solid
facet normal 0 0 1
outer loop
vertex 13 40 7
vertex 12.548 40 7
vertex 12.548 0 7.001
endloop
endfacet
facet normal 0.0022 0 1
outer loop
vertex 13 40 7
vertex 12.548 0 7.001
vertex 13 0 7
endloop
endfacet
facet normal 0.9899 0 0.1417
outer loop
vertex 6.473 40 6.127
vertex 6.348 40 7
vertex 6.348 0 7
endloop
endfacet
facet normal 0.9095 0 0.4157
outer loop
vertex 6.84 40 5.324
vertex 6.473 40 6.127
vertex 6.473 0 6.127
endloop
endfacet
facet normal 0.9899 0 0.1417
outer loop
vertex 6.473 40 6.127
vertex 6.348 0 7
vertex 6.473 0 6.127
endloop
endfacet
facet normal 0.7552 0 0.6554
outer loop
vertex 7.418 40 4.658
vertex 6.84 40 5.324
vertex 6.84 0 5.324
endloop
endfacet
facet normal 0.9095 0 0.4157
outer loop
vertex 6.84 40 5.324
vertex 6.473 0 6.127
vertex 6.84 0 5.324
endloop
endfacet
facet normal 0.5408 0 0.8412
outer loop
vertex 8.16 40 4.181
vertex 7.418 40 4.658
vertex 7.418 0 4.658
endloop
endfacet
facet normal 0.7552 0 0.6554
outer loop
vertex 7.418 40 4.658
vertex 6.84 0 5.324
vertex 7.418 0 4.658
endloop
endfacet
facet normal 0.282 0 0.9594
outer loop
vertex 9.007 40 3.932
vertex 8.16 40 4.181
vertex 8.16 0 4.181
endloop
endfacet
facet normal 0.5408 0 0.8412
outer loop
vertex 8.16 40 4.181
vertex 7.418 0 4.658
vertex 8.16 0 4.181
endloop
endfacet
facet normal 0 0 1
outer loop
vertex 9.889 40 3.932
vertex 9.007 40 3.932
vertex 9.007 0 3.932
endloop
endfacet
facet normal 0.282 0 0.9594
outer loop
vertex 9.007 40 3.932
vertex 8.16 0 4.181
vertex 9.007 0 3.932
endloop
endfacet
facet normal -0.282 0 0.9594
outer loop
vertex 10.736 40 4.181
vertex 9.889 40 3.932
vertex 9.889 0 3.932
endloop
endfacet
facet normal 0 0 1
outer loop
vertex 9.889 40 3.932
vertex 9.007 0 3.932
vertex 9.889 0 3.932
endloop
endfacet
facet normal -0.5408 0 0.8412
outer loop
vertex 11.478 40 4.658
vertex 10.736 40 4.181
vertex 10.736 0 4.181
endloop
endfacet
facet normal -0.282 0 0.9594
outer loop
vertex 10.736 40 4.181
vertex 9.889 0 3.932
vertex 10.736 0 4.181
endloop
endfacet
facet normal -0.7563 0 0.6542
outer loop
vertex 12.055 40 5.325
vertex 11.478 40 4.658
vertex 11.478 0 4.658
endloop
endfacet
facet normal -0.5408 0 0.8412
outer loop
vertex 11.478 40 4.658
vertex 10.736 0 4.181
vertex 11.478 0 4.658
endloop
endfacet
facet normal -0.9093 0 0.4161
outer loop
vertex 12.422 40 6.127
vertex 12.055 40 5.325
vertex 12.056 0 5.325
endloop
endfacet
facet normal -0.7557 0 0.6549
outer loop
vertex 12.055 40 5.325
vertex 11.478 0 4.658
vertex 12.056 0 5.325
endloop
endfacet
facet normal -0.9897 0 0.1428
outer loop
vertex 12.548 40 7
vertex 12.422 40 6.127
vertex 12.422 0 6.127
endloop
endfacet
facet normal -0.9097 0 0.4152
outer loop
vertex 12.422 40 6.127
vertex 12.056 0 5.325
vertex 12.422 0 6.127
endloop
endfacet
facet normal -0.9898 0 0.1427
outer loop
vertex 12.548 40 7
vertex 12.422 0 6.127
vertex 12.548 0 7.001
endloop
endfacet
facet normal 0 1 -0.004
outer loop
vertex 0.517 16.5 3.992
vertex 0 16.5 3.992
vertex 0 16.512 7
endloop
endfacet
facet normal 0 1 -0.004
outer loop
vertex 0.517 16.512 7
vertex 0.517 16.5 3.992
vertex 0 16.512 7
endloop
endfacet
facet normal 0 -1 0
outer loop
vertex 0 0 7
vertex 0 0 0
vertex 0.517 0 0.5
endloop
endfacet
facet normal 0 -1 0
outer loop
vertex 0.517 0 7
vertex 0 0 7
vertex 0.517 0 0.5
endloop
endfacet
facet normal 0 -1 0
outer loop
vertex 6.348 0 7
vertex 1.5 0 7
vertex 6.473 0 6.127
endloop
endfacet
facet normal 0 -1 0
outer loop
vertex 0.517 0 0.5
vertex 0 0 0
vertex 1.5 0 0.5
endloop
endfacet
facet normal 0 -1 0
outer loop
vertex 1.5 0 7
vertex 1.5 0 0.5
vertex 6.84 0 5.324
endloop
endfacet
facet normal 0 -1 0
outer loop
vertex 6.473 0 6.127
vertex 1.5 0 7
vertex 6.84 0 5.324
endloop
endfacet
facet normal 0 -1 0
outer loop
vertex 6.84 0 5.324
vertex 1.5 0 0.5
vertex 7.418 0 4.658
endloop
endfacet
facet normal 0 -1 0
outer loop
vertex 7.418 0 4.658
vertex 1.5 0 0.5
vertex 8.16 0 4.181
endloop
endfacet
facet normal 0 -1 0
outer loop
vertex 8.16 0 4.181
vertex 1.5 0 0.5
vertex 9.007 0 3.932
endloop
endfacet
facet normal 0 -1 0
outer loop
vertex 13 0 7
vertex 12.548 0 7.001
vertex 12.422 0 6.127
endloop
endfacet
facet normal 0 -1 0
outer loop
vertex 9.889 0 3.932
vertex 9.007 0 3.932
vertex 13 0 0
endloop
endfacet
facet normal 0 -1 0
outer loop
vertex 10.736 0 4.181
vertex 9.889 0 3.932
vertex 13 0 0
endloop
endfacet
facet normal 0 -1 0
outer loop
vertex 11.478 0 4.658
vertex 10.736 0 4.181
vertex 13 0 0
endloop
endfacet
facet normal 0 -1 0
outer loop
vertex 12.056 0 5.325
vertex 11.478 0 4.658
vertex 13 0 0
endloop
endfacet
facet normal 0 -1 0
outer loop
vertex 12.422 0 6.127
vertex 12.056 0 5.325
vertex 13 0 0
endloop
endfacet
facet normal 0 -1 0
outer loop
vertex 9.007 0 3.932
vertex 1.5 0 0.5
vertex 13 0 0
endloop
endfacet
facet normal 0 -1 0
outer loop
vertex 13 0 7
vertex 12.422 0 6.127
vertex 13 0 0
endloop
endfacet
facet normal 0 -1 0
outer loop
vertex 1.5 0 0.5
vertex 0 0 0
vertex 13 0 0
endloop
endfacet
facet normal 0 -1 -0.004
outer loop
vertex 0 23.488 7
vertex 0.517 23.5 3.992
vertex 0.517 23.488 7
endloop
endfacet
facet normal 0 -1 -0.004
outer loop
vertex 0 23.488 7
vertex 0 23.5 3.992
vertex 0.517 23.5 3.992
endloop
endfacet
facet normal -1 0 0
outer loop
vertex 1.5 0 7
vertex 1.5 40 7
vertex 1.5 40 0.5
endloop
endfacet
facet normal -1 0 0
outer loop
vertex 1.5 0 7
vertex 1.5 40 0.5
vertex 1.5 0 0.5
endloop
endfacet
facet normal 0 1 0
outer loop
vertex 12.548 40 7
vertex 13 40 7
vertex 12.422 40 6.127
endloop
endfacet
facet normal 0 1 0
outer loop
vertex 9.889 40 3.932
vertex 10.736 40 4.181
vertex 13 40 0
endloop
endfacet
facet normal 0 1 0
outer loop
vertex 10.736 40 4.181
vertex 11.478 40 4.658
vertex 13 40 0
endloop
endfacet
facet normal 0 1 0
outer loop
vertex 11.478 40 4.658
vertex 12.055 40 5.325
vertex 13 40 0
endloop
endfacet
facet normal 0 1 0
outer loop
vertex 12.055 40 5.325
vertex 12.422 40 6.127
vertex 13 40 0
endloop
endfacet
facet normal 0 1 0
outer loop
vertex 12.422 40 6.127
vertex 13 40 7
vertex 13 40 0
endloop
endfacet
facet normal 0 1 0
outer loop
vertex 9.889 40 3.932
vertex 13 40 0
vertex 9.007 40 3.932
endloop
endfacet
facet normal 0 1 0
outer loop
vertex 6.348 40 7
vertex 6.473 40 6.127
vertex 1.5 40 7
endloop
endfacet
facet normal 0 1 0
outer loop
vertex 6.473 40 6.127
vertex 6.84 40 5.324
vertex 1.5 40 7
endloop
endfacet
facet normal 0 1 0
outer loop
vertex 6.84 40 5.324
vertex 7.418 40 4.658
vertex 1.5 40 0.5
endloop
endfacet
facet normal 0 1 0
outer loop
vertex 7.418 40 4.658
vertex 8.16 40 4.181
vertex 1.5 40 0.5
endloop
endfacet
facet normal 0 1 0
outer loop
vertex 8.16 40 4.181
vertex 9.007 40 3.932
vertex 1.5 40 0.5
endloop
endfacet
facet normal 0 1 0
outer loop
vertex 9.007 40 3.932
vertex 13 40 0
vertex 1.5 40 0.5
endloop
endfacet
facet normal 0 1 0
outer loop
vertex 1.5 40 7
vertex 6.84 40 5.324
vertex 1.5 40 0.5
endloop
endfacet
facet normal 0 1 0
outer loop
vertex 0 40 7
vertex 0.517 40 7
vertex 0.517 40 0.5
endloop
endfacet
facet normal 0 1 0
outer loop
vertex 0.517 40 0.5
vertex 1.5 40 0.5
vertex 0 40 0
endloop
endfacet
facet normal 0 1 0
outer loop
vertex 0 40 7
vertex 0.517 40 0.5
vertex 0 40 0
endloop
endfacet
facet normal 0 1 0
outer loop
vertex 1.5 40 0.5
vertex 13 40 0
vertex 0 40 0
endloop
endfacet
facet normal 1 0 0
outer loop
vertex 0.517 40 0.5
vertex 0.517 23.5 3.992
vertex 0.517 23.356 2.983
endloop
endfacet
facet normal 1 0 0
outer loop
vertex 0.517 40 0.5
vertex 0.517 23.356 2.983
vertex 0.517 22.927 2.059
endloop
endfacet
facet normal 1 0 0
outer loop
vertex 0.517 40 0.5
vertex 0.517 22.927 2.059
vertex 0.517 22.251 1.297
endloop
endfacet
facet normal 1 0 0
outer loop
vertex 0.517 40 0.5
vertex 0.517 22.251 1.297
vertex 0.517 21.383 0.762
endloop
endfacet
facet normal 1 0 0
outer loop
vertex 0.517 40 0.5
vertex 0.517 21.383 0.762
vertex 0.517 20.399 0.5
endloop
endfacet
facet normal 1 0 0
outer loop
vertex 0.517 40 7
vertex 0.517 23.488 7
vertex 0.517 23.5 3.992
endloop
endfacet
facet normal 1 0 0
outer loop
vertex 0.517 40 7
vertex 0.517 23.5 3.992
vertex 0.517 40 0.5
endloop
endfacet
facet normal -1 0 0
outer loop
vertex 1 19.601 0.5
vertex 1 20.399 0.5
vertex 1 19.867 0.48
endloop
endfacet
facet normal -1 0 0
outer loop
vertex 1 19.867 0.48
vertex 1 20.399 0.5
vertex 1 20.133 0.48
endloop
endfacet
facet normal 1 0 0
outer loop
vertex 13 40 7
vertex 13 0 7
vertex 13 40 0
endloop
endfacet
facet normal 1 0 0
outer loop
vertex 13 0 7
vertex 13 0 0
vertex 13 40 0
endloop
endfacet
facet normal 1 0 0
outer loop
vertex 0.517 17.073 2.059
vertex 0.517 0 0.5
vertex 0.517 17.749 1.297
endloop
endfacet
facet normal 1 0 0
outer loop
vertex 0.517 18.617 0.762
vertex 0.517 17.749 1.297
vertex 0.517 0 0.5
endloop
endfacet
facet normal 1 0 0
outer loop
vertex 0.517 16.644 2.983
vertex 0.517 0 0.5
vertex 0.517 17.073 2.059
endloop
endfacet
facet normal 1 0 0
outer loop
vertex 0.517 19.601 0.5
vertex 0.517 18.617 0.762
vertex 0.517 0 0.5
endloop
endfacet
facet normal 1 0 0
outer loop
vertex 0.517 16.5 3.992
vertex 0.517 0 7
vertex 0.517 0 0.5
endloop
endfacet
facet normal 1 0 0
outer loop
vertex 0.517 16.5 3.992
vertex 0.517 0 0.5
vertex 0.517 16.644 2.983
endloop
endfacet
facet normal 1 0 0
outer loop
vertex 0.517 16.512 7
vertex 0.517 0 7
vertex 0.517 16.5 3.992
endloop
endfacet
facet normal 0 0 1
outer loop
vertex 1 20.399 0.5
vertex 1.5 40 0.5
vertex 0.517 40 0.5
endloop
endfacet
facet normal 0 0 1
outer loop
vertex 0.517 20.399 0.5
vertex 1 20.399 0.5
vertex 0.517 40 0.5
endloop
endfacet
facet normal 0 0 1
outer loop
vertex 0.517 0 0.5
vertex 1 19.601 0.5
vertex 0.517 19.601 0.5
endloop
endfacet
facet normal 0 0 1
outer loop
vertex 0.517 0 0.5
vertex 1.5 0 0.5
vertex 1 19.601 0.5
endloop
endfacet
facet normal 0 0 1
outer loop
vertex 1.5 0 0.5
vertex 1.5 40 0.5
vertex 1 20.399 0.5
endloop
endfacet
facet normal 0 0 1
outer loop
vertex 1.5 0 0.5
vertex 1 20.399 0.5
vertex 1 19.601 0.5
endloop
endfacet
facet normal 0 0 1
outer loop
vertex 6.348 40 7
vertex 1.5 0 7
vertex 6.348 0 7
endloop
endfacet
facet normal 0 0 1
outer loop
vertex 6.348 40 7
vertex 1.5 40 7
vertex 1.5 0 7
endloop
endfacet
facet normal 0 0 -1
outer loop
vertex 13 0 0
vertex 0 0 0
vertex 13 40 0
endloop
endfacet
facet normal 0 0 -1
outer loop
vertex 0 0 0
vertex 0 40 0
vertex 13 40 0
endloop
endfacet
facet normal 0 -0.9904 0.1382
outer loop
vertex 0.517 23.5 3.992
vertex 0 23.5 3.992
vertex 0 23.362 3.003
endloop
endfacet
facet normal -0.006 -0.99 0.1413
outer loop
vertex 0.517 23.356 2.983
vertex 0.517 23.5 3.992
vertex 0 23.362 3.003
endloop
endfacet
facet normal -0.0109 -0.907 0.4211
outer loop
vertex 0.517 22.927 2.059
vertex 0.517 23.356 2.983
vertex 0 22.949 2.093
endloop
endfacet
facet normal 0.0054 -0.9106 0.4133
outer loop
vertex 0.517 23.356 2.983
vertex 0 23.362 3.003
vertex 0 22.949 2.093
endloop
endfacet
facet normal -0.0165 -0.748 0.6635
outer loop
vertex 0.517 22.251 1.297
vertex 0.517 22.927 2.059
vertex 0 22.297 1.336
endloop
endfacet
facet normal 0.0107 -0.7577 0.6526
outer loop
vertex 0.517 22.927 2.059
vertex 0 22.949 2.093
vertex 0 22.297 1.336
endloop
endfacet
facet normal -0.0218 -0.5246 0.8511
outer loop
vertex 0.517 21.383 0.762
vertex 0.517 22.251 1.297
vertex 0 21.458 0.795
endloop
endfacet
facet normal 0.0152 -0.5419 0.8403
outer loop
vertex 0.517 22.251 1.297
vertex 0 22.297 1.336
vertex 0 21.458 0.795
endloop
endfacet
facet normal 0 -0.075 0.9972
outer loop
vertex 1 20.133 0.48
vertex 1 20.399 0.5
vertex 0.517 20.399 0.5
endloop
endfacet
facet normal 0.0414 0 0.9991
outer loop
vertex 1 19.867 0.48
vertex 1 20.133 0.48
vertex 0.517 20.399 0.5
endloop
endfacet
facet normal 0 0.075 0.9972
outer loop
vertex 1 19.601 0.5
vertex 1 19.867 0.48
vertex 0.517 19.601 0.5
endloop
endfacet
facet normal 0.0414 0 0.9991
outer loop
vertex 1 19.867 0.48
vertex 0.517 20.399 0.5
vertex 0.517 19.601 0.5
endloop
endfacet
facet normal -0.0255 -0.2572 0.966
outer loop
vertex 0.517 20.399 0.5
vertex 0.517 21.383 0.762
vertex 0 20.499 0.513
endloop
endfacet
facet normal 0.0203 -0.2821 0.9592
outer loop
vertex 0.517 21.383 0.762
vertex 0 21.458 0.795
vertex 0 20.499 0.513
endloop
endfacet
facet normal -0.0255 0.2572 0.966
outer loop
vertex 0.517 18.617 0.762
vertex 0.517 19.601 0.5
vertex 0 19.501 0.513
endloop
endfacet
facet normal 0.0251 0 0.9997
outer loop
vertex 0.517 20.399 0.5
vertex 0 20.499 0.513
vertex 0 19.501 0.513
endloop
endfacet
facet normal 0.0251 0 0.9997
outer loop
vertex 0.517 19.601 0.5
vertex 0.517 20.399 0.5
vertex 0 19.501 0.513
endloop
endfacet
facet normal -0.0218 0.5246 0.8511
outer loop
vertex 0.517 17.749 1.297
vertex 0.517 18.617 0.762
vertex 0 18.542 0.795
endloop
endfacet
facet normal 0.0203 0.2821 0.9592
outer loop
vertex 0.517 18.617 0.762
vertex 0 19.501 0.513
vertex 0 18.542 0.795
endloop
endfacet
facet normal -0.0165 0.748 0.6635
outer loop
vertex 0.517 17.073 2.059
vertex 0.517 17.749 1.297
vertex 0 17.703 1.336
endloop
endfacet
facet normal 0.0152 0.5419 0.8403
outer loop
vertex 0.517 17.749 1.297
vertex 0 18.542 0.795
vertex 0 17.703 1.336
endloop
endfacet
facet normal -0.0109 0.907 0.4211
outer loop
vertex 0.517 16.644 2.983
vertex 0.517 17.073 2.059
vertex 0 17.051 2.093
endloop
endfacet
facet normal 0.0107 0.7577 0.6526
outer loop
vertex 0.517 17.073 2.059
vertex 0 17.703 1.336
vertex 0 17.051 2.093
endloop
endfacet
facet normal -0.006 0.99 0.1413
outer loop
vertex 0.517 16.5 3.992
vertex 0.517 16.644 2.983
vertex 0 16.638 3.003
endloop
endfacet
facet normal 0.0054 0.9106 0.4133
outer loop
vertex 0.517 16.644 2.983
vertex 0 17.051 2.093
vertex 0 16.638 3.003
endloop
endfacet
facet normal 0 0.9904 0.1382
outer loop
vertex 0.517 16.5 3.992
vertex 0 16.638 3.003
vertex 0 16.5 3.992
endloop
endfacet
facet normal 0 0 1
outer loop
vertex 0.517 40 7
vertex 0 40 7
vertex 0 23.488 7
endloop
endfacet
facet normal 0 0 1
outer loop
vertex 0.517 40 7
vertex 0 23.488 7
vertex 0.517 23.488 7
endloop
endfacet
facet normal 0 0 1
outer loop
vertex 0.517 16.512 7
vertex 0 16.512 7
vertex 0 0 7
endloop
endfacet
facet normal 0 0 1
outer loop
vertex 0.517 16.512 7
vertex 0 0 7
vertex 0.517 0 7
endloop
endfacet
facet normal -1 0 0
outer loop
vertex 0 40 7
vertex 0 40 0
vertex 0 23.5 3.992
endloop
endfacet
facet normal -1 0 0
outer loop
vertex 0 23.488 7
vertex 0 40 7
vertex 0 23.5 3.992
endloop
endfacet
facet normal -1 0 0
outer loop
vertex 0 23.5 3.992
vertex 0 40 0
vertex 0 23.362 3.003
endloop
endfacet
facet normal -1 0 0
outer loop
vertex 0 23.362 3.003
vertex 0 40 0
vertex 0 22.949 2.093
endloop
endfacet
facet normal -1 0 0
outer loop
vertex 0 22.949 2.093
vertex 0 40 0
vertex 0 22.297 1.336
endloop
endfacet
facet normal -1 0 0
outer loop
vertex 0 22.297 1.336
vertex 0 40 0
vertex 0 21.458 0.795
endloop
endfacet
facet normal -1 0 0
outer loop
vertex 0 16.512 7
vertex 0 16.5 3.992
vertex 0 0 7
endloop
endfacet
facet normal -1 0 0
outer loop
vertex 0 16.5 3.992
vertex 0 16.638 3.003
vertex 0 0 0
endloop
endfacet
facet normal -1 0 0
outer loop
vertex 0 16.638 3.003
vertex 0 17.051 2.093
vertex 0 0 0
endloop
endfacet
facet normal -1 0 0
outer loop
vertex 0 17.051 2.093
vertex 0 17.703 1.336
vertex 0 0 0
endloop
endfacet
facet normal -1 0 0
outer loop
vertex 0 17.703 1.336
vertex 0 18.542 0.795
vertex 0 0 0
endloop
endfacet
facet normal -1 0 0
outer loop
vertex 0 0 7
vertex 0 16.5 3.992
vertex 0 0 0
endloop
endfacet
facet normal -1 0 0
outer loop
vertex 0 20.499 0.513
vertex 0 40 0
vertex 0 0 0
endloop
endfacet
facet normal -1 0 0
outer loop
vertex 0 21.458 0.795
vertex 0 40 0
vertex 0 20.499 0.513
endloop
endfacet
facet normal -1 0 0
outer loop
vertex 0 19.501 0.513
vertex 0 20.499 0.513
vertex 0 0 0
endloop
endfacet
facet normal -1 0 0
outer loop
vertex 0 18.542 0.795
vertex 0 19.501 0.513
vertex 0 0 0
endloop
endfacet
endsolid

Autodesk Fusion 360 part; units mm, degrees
sketch "Sketch1" plane through (0, 0, 0) normal (0, 0, 1) x (1, 0, 0)
  line L0 (0, 0) -> (13, 0)
  line L1 (13, 0) -> (13, 40)
  line L2 (13, 40) -> (0, 40)
  line L3 (0, 40) -> (0, 0)
  dimension "d1" = 13
  dimension "d2" = 40
extrude "Extrude1" add sketch "Sketch1" along normal blind 7 and the other way blind 0
sketch "Sketch2" plane through (0, 0, 0) normal (0, -1, 0) x (1, 0, 0)
  line L0 (0, 0) -> (13, 0)
  line L1 (13, 0) -> (13, 7)
  line L2 (13, 7) -> (0, 7)
  line L3 (0, 7) -> (0, 0)
  circle A0 centre (9.4477, 7.0008) radius 3.1
  dimension "d5" = 6.2
extrude "Extrude2" cut sketch "Sketch2" against normal blind 41 contours L2 A0 picked at (8.7012, 5.7442)
sketch "Sketch4" plane through (0, 0, 7) normal (0, 0, 1) x (-1, 0, 0)
  line L0 (-6.3477, 0) -> (-6.3477, -40)
  line L1 (-6.3477, -40) -> (0, -40)
  line L2 (0, -40) -> (0, 0)
  line L3 (0, 0) -> (-6.3477, 0)
  line L4 (-0.517, -40) -> (-1.5, -40)
  line L5 (-1.5, -40) -> (-1.5, 0)
  line L6 (-1.5, 0) -> (-0.517, 0)
  line L7 (-0.517, 0) -> (-0.517, -40)
extrude "Extrude4" cut sketch "Sketch4" against normal blind 6.5 contours L1 L3 L4 L5 L6 L7
sketch "Sketch5" plane through (0, 0, 0) normal (-1, 0, 0) x (0, -1, 0)
  line L0 (-40, 0) -> (0, 0)
  line L1 (0, 0) -> (0, 7)
  line L2 (0, 7) -> (-40, 7)
  line L3 (-40, 7) -> (-40, 0)
  circle A0 centre (-20, 3.9772) radius 3.5
  line L4 (-23.5, 3.9917) -> (-23.4875, 7)
  line L5 (-16.5, 3.9917) -> (-16.5125, 7)
  dimension "d15" = 7
extrude "Extrude5" cut sketch "Sketch5" against normal blind 1 contours L2 A0 L4 | L2 A0 L5 | L2 A0 picked at (-20.0897, 4.8292)
